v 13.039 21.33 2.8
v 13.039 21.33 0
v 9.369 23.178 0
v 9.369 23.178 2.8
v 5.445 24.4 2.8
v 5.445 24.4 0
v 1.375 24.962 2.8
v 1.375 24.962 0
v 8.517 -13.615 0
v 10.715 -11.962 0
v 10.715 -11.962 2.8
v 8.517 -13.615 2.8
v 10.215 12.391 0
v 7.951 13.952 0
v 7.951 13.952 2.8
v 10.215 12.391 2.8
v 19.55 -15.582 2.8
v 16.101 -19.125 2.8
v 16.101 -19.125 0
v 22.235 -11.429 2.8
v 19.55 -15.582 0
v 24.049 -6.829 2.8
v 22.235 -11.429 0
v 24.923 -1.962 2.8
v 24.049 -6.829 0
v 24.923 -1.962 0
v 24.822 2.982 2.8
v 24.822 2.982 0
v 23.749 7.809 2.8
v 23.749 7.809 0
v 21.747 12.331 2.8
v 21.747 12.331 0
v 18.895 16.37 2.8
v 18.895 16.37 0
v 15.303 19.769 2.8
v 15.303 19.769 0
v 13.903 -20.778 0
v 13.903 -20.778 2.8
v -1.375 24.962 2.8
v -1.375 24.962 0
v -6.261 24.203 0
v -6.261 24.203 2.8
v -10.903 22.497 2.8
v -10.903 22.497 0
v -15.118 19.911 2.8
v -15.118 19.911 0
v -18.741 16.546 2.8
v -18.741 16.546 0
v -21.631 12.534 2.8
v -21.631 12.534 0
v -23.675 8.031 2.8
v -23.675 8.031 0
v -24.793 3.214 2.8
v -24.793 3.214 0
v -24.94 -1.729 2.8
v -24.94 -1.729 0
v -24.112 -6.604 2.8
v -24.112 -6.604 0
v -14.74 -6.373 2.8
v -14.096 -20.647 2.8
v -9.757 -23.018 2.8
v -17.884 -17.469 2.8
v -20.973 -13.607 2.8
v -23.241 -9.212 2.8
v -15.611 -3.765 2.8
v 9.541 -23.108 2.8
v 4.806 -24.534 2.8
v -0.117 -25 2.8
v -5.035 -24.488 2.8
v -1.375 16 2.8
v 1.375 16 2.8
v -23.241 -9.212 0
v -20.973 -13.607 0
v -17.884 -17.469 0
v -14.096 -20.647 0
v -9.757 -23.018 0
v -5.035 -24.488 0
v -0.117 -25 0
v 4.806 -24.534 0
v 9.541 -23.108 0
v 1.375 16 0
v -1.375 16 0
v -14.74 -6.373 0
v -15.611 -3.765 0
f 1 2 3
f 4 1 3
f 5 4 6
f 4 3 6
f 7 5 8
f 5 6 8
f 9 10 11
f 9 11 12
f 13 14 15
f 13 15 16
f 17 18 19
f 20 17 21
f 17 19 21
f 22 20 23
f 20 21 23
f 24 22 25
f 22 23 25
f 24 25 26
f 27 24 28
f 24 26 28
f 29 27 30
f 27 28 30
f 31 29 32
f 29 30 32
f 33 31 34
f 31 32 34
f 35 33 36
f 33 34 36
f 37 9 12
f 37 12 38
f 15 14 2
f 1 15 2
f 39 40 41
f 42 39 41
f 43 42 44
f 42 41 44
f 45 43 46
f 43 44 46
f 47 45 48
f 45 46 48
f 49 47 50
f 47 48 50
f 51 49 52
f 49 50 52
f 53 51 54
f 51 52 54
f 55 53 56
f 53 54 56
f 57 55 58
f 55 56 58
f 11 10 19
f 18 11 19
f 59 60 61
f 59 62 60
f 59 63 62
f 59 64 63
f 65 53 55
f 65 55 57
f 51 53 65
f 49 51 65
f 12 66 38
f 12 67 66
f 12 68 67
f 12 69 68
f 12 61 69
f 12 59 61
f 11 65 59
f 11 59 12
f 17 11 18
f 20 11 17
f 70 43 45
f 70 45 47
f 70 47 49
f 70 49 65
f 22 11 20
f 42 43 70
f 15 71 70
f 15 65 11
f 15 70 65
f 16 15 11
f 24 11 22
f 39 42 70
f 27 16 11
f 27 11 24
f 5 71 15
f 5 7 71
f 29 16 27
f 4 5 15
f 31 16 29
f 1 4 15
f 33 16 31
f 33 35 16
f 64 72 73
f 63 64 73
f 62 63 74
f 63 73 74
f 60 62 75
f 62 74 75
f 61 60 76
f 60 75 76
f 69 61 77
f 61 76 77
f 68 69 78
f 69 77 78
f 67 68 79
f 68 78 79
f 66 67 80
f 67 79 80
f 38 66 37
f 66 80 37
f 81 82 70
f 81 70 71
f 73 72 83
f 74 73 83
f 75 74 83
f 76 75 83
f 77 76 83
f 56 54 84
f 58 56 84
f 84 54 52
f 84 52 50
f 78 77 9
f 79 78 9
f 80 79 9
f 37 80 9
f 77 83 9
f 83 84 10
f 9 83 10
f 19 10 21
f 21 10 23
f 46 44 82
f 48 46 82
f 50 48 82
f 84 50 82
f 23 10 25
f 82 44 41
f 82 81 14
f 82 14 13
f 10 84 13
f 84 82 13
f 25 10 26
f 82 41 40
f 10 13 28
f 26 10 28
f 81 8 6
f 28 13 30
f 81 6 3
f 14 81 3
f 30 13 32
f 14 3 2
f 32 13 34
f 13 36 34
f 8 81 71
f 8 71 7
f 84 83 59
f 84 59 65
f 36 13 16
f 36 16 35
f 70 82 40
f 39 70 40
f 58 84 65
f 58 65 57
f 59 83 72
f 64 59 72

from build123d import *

# Parameters (mm, degrees)
CROQUIS1_R              = 25
SALIENTE_EXTRUIR1_DEPTH = 2.8
CROQUIS2_W              = 2.75
CROQUIS2_H              = 18
CORTAR_EXTRUIR1_DEPTH   = 3.8
MATRIZC2_COUNT          = 4
MATRIZC2_ANGLE          = 325.41


with BuildPart() as part:
    # Croquis1 → Saliente-Extruir1 (new body)
    with BuildSketch(Plane.XY):
        Circle(CROQUIS1_R)
    extrude(amount=SALIENTE_EXTRUIR1_DEPTH)

    # Croquis2 → Cortar-Extruir1 (cut, through all)
    with BuildSketch(Plane.XY):
        with Locations((0, 25)):
            Rectangle(CROQUIS2_W, CROQUIS2_H)
    cortar_extruir1 = extrude(amount=CORTAR_EXTRUIR1_DEPTH, mode=Mode.SUBTRACT)

    # MatrizC2: Cortar-Extruir1 ×4 about axis
    matrizc2_axis = Axis((0, 0, 0), (0, 0, 1))
    for i in range(1, MATRIZC2_COUNT):
        add(cortar_extruir1.rotate(matrizc2_axis, i * MATRIZC2_ANGLE / (MATRIZC2_COUNT - 1)), mode=Mode.SUBTRACT)


solid = part.part
